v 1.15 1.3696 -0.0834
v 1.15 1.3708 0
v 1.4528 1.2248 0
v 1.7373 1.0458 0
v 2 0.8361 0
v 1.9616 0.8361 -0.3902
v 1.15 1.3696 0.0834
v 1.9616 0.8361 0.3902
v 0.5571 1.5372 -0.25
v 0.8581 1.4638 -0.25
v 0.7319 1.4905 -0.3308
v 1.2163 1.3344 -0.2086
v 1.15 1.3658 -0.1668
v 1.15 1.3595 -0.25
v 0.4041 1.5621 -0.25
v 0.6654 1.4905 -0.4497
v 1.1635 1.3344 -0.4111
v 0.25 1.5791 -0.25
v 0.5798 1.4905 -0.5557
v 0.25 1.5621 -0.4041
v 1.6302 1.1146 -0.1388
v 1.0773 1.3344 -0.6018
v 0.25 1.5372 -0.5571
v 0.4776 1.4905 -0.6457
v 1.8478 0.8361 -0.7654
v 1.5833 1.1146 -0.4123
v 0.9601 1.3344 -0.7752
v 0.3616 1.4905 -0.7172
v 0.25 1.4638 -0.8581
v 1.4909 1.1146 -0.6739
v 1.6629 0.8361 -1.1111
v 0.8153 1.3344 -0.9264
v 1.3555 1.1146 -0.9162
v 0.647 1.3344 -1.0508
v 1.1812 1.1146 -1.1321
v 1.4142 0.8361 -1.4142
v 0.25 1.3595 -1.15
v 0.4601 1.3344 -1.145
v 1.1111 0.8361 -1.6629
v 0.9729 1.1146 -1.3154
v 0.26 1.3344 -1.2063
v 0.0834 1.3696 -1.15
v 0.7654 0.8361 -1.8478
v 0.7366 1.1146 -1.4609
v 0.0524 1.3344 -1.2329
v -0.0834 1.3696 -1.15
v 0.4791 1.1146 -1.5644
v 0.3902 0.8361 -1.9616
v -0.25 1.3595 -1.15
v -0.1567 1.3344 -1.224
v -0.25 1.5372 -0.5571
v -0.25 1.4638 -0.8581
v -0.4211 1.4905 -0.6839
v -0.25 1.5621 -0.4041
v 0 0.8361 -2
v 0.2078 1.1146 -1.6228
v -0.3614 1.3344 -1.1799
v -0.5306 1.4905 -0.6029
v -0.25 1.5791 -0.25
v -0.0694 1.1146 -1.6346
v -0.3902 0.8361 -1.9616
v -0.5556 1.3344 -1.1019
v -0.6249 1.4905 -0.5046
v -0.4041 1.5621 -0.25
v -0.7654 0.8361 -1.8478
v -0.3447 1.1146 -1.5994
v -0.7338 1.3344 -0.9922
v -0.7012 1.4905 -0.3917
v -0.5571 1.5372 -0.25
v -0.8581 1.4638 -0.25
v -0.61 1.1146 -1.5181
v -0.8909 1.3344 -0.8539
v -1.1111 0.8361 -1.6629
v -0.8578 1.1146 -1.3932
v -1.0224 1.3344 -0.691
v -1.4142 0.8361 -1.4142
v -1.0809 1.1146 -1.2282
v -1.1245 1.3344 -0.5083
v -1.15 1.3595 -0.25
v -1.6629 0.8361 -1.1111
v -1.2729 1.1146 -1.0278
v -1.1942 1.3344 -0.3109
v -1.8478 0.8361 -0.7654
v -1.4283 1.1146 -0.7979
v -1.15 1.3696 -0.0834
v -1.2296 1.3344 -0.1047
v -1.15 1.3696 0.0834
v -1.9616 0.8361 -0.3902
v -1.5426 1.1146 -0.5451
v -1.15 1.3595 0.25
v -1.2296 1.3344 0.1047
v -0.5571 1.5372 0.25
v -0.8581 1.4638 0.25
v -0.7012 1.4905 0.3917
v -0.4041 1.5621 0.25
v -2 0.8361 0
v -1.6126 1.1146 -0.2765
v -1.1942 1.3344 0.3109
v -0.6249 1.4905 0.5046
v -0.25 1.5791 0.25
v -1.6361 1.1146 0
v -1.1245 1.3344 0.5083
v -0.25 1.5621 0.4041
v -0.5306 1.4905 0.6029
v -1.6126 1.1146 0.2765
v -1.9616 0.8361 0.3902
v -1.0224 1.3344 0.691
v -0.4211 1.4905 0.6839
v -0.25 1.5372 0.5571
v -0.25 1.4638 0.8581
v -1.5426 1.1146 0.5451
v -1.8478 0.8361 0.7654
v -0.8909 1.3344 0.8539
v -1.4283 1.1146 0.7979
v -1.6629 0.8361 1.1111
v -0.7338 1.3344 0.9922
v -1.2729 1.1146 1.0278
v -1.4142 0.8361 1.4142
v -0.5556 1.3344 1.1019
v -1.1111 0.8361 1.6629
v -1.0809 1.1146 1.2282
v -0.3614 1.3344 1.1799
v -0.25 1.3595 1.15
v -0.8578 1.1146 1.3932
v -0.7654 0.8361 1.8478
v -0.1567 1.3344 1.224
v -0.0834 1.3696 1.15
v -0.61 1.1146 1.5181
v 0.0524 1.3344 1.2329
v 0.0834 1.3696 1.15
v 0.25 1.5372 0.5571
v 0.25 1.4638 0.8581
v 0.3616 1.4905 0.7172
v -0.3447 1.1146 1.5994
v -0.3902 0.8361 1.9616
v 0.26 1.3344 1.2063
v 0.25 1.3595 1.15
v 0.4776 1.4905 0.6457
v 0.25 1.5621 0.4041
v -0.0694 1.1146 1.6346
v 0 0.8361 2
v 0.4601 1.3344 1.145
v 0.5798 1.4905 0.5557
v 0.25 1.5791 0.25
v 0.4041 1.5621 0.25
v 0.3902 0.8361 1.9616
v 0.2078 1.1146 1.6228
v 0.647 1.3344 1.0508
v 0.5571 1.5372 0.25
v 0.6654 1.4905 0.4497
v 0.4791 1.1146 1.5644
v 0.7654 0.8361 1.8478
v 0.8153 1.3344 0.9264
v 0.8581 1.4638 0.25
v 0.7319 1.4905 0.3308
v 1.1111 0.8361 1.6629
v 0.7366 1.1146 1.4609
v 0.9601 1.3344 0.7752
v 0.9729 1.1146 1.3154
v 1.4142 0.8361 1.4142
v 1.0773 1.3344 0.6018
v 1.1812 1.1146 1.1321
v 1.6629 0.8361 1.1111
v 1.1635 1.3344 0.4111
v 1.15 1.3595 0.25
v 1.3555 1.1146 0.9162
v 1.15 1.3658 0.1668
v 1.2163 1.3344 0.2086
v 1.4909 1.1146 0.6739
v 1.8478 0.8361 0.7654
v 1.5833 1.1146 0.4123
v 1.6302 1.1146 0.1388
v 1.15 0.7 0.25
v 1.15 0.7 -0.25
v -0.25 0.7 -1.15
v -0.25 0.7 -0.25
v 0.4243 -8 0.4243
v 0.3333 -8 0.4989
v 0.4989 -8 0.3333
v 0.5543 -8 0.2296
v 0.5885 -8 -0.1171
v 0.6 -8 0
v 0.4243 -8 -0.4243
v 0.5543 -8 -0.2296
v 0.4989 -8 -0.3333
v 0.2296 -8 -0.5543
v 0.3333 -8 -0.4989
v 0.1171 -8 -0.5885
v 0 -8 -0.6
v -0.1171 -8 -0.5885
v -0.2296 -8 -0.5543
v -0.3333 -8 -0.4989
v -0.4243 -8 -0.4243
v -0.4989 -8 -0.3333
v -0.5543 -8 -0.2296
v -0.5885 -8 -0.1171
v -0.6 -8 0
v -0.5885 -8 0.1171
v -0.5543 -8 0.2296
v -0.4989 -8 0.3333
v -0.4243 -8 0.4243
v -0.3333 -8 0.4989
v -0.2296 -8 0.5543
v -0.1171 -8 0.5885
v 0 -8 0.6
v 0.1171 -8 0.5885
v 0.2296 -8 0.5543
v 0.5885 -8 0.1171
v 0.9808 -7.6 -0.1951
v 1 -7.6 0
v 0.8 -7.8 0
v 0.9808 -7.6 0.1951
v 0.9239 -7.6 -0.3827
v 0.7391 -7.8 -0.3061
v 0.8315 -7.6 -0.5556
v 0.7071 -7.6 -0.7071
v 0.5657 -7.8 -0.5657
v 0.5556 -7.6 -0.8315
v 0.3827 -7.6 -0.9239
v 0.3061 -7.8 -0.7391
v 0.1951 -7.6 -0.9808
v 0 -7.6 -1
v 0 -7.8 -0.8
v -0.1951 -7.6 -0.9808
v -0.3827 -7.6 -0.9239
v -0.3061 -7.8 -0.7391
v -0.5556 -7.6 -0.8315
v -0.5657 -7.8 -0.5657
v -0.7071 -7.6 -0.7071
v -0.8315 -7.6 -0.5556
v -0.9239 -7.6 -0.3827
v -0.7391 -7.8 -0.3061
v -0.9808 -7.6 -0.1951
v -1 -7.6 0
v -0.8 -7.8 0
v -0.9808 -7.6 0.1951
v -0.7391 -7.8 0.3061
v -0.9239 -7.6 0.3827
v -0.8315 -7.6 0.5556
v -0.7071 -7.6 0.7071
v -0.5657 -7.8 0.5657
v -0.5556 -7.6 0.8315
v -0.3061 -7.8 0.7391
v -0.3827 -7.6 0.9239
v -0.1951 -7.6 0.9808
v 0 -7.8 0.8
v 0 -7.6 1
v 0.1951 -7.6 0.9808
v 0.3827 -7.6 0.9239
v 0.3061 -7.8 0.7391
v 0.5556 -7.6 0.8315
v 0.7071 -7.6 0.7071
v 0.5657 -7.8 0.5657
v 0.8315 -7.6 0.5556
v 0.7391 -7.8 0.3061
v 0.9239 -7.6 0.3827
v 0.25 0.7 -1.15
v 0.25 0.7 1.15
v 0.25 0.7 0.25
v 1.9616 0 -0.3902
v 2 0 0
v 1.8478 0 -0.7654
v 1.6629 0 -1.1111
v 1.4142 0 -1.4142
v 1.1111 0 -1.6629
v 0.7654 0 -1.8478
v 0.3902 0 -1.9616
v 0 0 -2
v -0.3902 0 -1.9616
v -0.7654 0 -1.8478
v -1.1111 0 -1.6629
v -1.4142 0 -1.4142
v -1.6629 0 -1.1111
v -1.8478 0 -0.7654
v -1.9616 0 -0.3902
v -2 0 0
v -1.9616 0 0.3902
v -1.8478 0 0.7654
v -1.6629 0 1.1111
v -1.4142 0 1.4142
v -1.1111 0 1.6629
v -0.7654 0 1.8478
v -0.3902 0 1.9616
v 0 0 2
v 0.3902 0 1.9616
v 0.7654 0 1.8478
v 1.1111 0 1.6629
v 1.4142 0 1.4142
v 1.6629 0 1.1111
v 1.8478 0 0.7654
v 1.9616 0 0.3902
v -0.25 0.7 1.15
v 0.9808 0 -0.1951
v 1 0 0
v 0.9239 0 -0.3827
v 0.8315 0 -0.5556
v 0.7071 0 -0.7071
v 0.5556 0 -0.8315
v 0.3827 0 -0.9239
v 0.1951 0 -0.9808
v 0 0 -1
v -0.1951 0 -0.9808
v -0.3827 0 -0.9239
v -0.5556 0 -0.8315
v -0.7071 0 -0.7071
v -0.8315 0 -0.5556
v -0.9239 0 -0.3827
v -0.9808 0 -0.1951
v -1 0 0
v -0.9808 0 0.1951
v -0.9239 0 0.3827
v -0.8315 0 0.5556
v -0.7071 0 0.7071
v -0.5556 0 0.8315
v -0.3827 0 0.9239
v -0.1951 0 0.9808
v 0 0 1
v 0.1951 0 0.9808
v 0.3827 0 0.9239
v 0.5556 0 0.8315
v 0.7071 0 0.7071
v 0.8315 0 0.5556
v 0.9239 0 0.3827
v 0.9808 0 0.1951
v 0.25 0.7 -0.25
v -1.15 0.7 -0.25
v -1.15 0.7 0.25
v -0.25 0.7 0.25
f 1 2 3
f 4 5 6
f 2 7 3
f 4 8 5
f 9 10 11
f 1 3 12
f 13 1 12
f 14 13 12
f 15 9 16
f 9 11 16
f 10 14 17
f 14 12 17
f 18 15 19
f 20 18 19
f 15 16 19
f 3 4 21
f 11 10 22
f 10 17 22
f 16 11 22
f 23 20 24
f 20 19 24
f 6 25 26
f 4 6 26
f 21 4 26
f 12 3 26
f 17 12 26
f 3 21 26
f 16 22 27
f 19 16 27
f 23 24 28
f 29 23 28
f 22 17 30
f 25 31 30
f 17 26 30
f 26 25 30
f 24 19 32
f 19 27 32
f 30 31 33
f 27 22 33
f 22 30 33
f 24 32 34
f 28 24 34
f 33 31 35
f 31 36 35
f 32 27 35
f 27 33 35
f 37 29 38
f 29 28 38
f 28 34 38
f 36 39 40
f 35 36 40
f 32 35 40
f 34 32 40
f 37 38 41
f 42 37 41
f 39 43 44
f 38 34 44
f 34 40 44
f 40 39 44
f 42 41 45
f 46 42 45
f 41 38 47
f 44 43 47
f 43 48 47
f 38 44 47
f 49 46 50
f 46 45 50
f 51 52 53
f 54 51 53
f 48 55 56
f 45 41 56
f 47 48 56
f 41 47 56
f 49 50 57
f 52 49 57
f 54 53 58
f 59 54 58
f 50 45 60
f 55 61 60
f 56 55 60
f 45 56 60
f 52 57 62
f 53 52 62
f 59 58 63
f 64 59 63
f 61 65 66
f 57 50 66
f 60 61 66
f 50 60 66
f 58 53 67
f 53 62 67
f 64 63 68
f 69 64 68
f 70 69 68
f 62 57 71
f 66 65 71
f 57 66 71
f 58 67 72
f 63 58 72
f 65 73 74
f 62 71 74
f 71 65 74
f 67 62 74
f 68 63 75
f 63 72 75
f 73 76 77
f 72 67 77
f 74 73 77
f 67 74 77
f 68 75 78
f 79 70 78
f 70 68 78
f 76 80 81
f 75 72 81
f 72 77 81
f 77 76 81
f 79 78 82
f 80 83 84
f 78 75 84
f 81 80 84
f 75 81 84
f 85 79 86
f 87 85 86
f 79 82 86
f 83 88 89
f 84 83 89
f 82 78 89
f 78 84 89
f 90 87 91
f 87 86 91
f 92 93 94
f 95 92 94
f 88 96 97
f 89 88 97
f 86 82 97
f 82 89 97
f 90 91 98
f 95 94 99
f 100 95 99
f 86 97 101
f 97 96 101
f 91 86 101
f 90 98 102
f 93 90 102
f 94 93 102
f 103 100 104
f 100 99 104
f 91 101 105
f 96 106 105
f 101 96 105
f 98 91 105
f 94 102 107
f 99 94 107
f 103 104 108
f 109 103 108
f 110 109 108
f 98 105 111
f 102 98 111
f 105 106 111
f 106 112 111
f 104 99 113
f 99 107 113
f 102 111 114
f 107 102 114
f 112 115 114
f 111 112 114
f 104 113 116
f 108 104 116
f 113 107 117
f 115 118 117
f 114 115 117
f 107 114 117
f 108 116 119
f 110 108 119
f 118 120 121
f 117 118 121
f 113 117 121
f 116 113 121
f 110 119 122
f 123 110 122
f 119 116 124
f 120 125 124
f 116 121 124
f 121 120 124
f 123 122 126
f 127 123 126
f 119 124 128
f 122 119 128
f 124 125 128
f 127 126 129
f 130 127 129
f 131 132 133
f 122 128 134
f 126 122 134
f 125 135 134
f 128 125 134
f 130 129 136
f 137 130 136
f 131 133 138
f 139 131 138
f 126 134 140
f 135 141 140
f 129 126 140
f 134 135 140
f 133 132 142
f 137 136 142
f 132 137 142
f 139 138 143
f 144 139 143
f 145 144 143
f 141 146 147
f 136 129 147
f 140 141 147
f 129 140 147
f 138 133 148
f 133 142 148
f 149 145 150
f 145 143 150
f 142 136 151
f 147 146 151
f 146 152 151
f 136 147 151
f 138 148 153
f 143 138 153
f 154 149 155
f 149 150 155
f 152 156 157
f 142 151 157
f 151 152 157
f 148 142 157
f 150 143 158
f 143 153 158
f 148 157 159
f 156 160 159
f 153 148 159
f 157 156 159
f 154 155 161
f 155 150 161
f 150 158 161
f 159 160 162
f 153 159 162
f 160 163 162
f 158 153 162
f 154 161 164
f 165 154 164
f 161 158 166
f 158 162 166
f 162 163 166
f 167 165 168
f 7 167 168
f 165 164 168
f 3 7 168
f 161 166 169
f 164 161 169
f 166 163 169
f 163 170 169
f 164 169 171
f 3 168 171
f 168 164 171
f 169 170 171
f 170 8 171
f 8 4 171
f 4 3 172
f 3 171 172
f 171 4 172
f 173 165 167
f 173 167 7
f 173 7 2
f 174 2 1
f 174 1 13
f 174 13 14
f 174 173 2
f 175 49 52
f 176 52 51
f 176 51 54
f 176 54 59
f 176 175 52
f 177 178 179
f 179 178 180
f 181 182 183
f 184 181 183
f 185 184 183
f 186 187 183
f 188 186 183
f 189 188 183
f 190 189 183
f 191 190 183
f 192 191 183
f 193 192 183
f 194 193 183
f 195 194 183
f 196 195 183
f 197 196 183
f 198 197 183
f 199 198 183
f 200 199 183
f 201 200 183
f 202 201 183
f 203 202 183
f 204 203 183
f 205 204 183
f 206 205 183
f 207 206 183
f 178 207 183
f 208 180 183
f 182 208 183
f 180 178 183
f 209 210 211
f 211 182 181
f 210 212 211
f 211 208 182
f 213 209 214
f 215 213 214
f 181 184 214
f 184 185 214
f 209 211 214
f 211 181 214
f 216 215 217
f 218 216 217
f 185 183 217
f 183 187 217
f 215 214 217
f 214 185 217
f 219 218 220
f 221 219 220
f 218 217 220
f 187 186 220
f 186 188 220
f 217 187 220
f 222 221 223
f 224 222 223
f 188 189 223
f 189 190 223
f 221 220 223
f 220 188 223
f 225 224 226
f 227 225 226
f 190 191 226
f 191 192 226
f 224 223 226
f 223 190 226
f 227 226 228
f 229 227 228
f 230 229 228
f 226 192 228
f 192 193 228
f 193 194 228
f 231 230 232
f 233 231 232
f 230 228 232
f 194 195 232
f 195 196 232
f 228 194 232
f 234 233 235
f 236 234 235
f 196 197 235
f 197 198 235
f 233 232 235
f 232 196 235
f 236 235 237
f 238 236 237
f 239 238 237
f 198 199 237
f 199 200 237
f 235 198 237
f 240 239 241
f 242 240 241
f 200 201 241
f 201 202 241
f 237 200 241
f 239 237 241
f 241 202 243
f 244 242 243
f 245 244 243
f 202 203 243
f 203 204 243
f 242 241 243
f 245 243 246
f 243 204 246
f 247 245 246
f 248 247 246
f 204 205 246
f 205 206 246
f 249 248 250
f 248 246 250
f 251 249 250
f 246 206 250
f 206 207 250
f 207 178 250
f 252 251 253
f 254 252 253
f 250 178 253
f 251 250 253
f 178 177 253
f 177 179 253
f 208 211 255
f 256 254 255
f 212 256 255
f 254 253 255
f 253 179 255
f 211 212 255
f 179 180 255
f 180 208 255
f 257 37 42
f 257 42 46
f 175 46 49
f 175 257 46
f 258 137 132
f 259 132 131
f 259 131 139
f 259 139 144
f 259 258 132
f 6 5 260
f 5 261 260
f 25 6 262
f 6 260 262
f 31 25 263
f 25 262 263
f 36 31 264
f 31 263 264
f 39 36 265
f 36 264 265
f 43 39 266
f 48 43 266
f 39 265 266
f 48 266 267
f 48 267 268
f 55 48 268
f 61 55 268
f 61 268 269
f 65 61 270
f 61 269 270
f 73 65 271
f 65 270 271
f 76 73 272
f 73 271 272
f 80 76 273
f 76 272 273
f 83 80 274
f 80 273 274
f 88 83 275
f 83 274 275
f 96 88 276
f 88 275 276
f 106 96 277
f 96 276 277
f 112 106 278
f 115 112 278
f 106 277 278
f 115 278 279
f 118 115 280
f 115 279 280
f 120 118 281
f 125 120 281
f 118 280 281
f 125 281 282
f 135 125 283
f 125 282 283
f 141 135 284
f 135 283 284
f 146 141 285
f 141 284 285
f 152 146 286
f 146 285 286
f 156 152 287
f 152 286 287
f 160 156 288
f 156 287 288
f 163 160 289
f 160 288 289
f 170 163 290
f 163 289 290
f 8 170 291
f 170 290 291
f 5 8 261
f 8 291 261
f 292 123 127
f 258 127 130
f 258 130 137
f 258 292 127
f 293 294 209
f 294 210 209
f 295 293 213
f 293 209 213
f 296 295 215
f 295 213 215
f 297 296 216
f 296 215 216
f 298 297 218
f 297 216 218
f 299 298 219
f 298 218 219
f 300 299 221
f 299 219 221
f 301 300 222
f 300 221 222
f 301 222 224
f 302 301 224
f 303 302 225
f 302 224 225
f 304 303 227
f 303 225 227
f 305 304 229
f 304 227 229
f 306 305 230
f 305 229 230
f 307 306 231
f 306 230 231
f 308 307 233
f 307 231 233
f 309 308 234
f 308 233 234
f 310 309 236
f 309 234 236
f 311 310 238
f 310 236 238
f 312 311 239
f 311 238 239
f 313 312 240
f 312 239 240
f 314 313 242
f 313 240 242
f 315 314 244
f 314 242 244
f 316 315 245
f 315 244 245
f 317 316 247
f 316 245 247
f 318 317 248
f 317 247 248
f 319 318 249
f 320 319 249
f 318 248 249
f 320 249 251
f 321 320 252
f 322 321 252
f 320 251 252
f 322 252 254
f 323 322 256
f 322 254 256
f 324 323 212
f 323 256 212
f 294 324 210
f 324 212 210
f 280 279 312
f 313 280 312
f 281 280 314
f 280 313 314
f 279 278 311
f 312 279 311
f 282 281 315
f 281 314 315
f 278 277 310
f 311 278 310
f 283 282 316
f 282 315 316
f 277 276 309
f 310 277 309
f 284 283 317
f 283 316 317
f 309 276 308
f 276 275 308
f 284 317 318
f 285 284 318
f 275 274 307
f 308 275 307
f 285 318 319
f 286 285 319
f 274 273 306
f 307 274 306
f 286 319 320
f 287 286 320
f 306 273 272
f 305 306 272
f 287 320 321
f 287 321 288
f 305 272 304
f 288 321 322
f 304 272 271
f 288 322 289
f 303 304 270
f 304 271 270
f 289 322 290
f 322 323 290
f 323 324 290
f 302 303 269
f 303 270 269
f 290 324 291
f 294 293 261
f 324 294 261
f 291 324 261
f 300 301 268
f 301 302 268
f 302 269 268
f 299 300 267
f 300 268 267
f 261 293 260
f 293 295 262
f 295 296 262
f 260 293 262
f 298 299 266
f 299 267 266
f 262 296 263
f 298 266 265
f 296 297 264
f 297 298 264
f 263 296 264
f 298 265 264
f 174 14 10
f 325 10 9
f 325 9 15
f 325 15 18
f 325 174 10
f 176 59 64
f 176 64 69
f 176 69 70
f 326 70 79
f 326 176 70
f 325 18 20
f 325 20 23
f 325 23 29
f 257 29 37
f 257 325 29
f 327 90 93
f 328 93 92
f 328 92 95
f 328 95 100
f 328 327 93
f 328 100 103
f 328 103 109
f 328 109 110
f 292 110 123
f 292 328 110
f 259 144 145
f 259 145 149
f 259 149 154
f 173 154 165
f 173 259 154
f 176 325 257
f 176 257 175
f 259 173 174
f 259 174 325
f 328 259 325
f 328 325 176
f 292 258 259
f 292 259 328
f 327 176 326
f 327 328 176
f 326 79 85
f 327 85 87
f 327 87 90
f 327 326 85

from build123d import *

# Parameters (mm, degrees)
CUT_EXTRUDE1_START = -0.7
CUT_EXTRUDE1_DEPTH = 8.785281374


with BuildPart() as part:
    # Sketch1 → Revolve1 (revolve)
    with BuildSketch(Plane.XY, mode=Mode.PRIVATE) as revolve1_sk:
        with BuildLine():
            Line((-2, 0), (-1, 0))
            Line((-1, 0), (-1, -7.6))
            Line((-1, -7.6), (-0.6, -8))
            Line((-0.6, -8), (0, -8))
            Line((0, -8), (0, 1.6))
            ThreePointArc((0, 1.6), (-1.070466269, 1.402517077), (-2, 0.836067977))
            Line((-2, 0.836067977), (-2, 0))
        make_face()
    revolve(revolve1_sk.sketch.rotate(Axis((0, -8, 0), (0, 1, 0)), 180), axis=Axis((0, -8, 0), (0, 1, 0)))

    # Sketch2 → Cut-Extrude1 (cut, through all)
    with BuildSketch(Plane.XZ.offset(CUT_EXTRUDE1_START)):
        Polygon((-0.25, 1.15), (0.25, 1.15), (0.25, 0.25), (1.15, 0.25), (1.15, -0.25), (0.25, -0.25), (0.25, -1.15), (-0.25, -1.15), (-0.25, -0.25), (-1.15, -0.25), (-1.15, 0.25), (-0.25, 0.25), align=None)
    extrude(amount=-CUT_EXTRUDE1_DEPTH, mode=Mode.SUBTRACT)


solid = part.part
